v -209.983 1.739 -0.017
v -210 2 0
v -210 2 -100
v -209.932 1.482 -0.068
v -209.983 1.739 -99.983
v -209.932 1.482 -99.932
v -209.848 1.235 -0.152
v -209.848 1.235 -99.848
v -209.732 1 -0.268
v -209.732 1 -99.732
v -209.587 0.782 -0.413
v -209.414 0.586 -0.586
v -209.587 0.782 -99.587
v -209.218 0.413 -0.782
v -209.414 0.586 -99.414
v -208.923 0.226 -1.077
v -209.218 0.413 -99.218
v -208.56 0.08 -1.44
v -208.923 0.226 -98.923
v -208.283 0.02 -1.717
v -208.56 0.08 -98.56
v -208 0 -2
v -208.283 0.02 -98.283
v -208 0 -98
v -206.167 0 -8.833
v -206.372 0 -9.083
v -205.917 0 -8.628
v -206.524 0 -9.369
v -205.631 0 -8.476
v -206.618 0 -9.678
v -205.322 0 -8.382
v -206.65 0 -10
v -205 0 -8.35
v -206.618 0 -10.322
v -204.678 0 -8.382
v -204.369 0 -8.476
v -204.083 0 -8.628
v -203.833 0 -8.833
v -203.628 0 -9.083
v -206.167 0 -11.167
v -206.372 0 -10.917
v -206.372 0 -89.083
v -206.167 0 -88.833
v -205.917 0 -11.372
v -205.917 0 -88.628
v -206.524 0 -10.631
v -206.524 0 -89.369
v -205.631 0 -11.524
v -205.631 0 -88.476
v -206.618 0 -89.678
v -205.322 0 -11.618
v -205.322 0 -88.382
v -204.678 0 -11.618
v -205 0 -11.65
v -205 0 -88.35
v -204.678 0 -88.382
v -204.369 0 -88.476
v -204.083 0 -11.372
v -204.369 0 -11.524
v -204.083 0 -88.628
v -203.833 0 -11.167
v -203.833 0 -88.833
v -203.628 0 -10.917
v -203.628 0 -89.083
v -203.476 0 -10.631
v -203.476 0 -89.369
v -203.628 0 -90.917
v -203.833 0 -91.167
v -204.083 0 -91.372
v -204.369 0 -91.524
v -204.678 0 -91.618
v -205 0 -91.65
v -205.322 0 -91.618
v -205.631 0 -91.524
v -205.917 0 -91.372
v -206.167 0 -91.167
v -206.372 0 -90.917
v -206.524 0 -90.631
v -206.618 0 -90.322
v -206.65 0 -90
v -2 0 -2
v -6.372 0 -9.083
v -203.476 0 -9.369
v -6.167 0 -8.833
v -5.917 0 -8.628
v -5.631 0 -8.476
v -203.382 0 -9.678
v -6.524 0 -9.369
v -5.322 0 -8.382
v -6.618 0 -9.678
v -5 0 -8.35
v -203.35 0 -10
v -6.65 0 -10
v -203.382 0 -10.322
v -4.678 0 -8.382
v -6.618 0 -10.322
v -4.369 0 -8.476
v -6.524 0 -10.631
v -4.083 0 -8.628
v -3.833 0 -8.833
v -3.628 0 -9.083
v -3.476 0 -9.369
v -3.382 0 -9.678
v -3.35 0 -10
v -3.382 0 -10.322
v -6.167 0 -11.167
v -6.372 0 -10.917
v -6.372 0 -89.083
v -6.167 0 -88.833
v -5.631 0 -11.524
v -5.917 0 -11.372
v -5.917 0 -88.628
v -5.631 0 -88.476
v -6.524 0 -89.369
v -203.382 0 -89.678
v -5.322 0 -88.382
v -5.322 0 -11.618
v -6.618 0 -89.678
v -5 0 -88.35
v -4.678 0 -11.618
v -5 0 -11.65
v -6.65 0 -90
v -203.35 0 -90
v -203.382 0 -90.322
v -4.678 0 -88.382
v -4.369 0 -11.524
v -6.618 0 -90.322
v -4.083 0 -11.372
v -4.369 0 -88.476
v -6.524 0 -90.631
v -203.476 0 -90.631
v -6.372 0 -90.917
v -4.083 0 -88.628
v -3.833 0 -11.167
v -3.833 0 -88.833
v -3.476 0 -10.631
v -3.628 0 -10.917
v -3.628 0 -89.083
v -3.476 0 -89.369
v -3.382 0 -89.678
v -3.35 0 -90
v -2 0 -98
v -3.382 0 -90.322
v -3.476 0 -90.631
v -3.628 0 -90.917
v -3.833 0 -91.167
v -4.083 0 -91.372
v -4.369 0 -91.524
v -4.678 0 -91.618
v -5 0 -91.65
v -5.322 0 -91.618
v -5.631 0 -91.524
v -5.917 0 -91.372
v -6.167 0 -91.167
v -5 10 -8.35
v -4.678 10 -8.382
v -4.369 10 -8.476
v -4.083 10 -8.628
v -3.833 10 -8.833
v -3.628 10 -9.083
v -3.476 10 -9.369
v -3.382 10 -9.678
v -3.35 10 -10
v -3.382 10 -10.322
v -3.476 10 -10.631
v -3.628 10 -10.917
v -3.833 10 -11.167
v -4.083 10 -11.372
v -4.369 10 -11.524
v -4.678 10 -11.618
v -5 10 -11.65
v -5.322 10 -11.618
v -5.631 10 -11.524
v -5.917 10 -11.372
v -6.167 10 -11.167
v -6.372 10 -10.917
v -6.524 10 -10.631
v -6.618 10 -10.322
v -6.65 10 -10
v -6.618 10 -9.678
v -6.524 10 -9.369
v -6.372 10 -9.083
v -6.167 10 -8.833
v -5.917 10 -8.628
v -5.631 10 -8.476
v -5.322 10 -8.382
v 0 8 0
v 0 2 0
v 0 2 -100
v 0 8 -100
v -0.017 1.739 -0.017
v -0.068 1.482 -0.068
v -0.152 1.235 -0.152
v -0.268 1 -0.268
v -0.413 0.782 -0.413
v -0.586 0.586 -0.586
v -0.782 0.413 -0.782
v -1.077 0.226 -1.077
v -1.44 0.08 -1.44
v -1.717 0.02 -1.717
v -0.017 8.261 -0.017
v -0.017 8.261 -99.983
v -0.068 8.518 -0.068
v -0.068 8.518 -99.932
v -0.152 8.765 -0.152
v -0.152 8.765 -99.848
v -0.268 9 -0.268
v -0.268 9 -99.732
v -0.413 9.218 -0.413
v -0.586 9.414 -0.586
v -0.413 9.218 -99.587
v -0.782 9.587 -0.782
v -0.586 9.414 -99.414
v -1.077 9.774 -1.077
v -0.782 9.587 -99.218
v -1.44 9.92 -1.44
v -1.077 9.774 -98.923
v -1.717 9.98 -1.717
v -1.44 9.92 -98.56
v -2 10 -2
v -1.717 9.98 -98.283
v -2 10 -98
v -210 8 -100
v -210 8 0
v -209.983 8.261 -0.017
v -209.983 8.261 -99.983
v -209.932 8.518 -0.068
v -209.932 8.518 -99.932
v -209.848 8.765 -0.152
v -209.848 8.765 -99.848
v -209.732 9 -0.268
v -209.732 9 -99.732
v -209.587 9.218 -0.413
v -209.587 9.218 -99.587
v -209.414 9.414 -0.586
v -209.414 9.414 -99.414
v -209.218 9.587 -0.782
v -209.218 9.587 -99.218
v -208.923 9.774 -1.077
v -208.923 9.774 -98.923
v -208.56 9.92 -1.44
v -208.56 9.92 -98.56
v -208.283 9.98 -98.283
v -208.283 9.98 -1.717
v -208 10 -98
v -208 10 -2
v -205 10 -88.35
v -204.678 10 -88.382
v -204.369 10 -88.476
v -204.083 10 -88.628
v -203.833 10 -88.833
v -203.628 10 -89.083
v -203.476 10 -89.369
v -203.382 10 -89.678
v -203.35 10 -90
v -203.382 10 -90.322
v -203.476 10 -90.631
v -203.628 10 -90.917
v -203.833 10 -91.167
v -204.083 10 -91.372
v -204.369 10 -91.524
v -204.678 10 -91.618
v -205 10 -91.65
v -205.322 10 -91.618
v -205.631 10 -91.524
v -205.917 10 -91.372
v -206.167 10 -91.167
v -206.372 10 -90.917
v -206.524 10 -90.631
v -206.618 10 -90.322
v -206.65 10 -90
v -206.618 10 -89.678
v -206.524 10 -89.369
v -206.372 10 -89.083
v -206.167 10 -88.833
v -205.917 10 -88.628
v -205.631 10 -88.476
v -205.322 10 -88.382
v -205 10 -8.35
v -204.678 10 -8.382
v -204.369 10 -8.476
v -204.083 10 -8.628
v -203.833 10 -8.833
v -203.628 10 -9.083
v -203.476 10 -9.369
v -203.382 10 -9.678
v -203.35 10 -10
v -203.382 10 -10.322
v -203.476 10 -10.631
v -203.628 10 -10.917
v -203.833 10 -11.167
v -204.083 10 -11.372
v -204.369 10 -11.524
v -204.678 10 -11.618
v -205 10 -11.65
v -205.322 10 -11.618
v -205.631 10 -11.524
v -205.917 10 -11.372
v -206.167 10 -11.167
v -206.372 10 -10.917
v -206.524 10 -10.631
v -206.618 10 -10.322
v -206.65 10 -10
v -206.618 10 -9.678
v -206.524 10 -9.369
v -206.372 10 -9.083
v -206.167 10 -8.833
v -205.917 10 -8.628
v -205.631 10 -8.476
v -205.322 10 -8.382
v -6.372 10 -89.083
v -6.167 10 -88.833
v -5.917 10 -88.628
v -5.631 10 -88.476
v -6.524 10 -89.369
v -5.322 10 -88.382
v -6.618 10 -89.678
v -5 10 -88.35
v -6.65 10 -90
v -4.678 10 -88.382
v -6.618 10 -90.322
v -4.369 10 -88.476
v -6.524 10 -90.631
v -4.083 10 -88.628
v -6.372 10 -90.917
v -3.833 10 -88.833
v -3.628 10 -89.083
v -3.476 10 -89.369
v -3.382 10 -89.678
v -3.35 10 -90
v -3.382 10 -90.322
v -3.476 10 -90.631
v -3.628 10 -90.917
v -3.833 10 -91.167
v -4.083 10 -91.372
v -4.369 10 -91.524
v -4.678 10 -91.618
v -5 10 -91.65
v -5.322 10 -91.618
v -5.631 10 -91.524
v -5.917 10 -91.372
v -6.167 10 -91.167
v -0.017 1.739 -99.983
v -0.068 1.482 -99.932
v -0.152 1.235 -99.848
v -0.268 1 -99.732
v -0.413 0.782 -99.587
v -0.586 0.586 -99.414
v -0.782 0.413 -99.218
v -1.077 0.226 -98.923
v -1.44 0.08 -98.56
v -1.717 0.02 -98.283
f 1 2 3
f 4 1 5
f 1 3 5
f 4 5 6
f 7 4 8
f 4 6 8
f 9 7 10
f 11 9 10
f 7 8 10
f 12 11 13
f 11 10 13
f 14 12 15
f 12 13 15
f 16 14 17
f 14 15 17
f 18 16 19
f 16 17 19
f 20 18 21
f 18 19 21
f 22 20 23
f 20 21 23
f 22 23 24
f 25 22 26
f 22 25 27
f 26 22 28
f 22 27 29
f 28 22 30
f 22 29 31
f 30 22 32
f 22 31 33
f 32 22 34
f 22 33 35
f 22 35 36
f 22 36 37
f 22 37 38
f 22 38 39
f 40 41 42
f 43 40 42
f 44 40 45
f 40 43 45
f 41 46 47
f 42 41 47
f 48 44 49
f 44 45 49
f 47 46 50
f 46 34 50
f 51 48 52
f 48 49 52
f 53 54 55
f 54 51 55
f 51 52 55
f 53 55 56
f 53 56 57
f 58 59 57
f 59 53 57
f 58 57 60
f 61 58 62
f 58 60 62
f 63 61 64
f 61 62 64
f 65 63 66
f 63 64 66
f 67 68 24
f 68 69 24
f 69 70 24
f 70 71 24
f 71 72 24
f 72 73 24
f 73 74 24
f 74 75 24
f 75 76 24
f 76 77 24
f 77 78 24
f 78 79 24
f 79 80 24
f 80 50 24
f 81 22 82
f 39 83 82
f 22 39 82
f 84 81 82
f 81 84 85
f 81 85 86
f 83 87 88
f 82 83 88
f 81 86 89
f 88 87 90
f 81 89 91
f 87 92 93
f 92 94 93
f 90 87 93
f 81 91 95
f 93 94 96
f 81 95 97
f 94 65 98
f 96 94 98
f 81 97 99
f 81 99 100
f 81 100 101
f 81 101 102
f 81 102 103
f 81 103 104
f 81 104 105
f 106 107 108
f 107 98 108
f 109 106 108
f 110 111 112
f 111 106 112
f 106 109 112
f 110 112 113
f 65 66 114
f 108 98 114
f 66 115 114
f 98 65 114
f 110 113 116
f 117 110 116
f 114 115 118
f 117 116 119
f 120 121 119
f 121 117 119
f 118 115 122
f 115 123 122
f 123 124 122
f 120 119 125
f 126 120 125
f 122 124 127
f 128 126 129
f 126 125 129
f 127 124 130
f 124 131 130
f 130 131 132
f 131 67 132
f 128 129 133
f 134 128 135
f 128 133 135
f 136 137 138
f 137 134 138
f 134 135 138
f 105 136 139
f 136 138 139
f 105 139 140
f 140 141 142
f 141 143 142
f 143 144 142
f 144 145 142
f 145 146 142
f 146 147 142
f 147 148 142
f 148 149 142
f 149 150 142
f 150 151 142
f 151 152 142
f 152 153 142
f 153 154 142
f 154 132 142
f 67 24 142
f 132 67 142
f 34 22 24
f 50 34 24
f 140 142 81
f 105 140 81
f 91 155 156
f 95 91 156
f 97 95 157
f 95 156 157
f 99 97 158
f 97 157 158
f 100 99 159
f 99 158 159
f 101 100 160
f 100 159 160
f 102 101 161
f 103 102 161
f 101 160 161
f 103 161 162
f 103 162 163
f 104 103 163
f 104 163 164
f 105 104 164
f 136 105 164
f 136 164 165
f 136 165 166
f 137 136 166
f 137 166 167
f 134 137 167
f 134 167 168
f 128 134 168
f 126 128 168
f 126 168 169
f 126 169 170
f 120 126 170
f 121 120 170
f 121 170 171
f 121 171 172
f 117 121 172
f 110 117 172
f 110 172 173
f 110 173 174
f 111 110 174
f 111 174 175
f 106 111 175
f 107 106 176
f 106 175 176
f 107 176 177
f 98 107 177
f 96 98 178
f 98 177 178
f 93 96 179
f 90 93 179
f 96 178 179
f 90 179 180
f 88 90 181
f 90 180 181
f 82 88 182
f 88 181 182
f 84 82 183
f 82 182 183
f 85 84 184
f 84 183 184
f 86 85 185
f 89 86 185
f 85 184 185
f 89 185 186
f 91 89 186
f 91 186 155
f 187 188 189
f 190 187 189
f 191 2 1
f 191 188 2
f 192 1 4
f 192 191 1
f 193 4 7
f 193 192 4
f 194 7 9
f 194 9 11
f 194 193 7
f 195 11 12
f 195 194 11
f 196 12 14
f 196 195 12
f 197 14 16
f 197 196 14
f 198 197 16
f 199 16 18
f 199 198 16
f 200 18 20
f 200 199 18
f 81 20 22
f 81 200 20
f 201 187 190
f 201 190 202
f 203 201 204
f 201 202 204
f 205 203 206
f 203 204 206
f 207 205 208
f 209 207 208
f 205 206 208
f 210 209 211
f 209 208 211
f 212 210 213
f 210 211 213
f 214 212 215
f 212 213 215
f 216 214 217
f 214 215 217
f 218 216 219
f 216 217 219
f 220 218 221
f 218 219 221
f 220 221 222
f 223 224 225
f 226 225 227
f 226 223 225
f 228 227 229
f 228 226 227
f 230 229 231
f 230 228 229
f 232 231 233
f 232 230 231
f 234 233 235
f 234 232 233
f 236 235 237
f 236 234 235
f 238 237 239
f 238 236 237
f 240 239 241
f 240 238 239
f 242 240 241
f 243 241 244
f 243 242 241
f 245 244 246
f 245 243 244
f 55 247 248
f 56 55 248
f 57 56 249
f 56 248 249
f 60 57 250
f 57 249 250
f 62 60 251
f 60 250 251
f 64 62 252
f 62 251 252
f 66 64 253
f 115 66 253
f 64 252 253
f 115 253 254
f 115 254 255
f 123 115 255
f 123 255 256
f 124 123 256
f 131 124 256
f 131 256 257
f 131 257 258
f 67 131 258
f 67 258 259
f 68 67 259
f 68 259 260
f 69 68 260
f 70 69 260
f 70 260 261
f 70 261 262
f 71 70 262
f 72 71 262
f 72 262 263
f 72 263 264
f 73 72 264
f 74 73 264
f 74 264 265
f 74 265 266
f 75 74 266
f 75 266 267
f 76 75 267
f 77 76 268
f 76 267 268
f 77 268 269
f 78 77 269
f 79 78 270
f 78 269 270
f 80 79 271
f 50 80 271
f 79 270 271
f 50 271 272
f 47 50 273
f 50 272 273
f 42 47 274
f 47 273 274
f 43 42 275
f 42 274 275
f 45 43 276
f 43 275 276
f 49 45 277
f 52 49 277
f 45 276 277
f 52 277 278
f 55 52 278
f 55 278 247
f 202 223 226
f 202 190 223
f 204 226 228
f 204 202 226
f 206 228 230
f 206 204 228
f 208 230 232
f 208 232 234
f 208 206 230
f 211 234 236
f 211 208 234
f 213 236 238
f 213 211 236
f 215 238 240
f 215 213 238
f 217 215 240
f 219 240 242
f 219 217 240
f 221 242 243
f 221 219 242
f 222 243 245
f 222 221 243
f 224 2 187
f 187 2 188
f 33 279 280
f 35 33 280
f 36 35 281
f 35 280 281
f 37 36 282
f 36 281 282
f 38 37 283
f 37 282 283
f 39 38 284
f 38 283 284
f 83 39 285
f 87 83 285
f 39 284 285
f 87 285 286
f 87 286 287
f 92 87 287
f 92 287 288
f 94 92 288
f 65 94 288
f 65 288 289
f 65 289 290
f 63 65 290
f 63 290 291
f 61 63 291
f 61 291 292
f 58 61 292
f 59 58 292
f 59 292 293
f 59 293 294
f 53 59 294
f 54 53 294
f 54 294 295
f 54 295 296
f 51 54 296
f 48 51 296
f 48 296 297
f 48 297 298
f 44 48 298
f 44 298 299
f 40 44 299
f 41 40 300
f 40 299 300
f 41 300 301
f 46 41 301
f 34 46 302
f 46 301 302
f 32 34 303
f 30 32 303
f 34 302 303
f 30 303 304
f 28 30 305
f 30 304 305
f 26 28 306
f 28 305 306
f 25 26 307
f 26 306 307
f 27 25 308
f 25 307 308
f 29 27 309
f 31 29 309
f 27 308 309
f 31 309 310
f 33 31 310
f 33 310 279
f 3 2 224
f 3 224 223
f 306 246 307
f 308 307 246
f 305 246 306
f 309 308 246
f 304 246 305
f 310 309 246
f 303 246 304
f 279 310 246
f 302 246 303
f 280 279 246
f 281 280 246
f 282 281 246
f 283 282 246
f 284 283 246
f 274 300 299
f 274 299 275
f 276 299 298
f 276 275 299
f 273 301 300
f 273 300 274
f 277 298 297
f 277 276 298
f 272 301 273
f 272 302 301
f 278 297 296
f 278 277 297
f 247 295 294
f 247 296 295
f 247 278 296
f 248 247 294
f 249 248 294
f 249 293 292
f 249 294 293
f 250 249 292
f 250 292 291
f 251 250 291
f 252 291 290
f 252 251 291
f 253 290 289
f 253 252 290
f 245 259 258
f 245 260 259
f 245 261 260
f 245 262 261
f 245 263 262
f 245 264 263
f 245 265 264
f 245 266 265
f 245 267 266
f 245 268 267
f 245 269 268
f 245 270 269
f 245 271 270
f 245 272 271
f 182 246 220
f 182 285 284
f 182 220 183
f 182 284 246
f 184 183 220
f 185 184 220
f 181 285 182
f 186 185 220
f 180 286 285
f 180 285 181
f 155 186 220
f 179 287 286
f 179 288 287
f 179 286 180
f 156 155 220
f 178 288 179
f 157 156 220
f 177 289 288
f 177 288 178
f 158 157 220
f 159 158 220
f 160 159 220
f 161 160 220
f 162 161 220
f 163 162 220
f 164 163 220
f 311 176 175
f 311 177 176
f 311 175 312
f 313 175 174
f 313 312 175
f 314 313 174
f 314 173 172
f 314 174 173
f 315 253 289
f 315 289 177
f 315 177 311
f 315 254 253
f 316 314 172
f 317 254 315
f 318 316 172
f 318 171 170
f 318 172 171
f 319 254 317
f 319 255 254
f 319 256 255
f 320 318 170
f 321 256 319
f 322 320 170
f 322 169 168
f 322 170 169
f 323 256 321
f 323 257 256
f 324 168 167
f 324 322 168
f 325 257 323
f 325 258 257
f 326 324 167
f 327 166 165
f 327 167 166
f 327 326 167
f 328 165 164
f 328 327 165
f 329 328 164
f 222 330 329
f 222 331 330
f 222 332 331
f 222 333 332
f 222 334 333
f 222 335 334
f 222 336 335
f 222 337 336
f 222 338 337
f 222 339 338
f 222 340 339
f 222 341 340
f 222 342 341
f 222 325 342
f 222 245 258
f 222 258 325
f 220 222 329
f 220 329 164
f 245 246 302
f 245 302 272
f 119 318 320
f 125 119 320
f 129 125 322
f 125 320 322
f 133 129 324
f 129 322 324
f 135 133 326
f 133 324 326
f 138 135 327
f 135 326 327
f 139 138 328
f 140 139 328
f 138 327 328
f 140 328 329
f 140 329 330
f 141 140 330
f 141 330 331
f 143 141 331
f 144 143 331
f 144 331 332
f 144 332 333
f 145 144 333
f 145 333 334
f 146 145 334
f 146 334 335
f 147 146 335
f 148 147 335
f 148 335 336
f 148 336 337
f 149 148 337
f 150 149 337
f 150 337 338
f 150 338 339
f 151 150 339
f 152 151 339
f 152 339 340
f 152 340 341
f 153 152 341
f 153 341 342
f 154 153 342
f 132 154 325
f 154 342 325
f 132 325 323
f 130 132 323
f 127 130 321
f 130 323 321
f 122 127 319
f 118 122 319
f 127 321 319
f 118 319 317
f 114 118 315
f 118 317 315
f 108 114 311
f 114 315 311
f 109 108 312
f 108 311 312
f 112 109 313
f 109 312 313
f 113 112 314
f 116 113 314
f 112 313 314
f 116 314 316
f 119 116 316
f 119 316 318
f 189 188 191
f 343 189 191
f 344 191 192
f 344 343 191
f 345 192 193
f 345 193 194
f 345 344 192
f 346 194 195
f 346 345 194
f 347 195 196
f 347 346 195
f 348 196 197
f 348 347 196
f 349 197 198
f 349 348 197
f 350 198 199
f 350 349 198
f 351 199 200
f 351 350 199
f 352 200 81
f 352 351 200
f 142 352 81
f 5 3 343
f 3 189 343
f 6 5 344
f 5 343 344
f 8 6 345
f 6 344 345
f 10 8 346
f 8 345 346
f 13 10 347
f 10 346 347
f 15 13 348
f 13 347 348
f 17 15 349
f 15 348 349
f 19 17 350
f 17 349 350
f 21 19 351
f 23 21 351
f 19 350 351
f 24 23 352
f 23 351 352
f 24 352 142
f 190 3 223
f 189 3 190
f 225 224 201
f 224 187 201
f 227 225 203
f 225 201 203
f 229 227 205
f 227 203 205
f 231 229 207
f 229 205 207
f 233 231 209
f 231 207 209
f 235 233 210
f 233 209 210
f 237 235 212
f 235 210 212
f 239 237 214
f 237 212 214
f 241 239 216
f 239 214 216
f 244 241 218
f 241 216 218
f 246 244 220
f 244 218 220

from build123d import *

# Parameters (mm, degrees)
SKETCH_1_W          = 210
SKETCH_1_H          = 100
EXTRUDE_1_DEPTH     = 10
FILLET_1_R          = 2
SKETCH_2_R          = 1.65
CUT_EXTRUDE_1_DEPTH = 233.808934536


with BuildPart() as part:
    # 草图1 → 凸台-拉伸1 (new body)
    with BuildSketch(Plane(origin=(0, 0, 0), x_dir=(1, 0, 0), z_dir=(0, 1, 0))):
        with Locations((-105, 50)):
            Rectangle(SKETCH_1_W, SKETCH_1_H)
    extrude(amount=EXTRUDE_1_DEPTH)

    # 圆角1
    fillet_1_edges = [part.edges().sort_by_distance(p)[0] for p in [
        (0, 10, -50),
        (-105, 10, -100),
        (-210, 10, -50),
        (-105, 0, -100),
        (0, 0, -50),
        (-105, 0, 0),
        (-210, 0, -50),
        (-105, 10, 0),
    ]]
    fillet(fillet_1_edges, radius=FILLET_1_R)

    # 草图2 → 切除-拉伸1 (cut, through all)
    with BuildSketch(Plane(origin=(0, 10, 0), x_dir=(1, 0, 0), z_dir=(0, 1, 0))):
        with Locations(Location((-205, 10, 0), (0, 0, 270))):
            Circle(SKETCH_2_R)
        with Locations(Location((-205, 90, 0), (0, 0, 270))):
            Circle(SKETCH_2_R)
        with Locations(Location((-5, 90, 0), (0, 0, 270))):
            Circle(SKETCH_2_R)
        with Locations(Location((-5, 10, 0), (0, 0, 270))):
            Circle(SKETCH_2_R)
    extrude(amount=-CUT_EXTRUDE_1_DEPTH, mode=Mode.SUBTRACT)


solid = part.part
